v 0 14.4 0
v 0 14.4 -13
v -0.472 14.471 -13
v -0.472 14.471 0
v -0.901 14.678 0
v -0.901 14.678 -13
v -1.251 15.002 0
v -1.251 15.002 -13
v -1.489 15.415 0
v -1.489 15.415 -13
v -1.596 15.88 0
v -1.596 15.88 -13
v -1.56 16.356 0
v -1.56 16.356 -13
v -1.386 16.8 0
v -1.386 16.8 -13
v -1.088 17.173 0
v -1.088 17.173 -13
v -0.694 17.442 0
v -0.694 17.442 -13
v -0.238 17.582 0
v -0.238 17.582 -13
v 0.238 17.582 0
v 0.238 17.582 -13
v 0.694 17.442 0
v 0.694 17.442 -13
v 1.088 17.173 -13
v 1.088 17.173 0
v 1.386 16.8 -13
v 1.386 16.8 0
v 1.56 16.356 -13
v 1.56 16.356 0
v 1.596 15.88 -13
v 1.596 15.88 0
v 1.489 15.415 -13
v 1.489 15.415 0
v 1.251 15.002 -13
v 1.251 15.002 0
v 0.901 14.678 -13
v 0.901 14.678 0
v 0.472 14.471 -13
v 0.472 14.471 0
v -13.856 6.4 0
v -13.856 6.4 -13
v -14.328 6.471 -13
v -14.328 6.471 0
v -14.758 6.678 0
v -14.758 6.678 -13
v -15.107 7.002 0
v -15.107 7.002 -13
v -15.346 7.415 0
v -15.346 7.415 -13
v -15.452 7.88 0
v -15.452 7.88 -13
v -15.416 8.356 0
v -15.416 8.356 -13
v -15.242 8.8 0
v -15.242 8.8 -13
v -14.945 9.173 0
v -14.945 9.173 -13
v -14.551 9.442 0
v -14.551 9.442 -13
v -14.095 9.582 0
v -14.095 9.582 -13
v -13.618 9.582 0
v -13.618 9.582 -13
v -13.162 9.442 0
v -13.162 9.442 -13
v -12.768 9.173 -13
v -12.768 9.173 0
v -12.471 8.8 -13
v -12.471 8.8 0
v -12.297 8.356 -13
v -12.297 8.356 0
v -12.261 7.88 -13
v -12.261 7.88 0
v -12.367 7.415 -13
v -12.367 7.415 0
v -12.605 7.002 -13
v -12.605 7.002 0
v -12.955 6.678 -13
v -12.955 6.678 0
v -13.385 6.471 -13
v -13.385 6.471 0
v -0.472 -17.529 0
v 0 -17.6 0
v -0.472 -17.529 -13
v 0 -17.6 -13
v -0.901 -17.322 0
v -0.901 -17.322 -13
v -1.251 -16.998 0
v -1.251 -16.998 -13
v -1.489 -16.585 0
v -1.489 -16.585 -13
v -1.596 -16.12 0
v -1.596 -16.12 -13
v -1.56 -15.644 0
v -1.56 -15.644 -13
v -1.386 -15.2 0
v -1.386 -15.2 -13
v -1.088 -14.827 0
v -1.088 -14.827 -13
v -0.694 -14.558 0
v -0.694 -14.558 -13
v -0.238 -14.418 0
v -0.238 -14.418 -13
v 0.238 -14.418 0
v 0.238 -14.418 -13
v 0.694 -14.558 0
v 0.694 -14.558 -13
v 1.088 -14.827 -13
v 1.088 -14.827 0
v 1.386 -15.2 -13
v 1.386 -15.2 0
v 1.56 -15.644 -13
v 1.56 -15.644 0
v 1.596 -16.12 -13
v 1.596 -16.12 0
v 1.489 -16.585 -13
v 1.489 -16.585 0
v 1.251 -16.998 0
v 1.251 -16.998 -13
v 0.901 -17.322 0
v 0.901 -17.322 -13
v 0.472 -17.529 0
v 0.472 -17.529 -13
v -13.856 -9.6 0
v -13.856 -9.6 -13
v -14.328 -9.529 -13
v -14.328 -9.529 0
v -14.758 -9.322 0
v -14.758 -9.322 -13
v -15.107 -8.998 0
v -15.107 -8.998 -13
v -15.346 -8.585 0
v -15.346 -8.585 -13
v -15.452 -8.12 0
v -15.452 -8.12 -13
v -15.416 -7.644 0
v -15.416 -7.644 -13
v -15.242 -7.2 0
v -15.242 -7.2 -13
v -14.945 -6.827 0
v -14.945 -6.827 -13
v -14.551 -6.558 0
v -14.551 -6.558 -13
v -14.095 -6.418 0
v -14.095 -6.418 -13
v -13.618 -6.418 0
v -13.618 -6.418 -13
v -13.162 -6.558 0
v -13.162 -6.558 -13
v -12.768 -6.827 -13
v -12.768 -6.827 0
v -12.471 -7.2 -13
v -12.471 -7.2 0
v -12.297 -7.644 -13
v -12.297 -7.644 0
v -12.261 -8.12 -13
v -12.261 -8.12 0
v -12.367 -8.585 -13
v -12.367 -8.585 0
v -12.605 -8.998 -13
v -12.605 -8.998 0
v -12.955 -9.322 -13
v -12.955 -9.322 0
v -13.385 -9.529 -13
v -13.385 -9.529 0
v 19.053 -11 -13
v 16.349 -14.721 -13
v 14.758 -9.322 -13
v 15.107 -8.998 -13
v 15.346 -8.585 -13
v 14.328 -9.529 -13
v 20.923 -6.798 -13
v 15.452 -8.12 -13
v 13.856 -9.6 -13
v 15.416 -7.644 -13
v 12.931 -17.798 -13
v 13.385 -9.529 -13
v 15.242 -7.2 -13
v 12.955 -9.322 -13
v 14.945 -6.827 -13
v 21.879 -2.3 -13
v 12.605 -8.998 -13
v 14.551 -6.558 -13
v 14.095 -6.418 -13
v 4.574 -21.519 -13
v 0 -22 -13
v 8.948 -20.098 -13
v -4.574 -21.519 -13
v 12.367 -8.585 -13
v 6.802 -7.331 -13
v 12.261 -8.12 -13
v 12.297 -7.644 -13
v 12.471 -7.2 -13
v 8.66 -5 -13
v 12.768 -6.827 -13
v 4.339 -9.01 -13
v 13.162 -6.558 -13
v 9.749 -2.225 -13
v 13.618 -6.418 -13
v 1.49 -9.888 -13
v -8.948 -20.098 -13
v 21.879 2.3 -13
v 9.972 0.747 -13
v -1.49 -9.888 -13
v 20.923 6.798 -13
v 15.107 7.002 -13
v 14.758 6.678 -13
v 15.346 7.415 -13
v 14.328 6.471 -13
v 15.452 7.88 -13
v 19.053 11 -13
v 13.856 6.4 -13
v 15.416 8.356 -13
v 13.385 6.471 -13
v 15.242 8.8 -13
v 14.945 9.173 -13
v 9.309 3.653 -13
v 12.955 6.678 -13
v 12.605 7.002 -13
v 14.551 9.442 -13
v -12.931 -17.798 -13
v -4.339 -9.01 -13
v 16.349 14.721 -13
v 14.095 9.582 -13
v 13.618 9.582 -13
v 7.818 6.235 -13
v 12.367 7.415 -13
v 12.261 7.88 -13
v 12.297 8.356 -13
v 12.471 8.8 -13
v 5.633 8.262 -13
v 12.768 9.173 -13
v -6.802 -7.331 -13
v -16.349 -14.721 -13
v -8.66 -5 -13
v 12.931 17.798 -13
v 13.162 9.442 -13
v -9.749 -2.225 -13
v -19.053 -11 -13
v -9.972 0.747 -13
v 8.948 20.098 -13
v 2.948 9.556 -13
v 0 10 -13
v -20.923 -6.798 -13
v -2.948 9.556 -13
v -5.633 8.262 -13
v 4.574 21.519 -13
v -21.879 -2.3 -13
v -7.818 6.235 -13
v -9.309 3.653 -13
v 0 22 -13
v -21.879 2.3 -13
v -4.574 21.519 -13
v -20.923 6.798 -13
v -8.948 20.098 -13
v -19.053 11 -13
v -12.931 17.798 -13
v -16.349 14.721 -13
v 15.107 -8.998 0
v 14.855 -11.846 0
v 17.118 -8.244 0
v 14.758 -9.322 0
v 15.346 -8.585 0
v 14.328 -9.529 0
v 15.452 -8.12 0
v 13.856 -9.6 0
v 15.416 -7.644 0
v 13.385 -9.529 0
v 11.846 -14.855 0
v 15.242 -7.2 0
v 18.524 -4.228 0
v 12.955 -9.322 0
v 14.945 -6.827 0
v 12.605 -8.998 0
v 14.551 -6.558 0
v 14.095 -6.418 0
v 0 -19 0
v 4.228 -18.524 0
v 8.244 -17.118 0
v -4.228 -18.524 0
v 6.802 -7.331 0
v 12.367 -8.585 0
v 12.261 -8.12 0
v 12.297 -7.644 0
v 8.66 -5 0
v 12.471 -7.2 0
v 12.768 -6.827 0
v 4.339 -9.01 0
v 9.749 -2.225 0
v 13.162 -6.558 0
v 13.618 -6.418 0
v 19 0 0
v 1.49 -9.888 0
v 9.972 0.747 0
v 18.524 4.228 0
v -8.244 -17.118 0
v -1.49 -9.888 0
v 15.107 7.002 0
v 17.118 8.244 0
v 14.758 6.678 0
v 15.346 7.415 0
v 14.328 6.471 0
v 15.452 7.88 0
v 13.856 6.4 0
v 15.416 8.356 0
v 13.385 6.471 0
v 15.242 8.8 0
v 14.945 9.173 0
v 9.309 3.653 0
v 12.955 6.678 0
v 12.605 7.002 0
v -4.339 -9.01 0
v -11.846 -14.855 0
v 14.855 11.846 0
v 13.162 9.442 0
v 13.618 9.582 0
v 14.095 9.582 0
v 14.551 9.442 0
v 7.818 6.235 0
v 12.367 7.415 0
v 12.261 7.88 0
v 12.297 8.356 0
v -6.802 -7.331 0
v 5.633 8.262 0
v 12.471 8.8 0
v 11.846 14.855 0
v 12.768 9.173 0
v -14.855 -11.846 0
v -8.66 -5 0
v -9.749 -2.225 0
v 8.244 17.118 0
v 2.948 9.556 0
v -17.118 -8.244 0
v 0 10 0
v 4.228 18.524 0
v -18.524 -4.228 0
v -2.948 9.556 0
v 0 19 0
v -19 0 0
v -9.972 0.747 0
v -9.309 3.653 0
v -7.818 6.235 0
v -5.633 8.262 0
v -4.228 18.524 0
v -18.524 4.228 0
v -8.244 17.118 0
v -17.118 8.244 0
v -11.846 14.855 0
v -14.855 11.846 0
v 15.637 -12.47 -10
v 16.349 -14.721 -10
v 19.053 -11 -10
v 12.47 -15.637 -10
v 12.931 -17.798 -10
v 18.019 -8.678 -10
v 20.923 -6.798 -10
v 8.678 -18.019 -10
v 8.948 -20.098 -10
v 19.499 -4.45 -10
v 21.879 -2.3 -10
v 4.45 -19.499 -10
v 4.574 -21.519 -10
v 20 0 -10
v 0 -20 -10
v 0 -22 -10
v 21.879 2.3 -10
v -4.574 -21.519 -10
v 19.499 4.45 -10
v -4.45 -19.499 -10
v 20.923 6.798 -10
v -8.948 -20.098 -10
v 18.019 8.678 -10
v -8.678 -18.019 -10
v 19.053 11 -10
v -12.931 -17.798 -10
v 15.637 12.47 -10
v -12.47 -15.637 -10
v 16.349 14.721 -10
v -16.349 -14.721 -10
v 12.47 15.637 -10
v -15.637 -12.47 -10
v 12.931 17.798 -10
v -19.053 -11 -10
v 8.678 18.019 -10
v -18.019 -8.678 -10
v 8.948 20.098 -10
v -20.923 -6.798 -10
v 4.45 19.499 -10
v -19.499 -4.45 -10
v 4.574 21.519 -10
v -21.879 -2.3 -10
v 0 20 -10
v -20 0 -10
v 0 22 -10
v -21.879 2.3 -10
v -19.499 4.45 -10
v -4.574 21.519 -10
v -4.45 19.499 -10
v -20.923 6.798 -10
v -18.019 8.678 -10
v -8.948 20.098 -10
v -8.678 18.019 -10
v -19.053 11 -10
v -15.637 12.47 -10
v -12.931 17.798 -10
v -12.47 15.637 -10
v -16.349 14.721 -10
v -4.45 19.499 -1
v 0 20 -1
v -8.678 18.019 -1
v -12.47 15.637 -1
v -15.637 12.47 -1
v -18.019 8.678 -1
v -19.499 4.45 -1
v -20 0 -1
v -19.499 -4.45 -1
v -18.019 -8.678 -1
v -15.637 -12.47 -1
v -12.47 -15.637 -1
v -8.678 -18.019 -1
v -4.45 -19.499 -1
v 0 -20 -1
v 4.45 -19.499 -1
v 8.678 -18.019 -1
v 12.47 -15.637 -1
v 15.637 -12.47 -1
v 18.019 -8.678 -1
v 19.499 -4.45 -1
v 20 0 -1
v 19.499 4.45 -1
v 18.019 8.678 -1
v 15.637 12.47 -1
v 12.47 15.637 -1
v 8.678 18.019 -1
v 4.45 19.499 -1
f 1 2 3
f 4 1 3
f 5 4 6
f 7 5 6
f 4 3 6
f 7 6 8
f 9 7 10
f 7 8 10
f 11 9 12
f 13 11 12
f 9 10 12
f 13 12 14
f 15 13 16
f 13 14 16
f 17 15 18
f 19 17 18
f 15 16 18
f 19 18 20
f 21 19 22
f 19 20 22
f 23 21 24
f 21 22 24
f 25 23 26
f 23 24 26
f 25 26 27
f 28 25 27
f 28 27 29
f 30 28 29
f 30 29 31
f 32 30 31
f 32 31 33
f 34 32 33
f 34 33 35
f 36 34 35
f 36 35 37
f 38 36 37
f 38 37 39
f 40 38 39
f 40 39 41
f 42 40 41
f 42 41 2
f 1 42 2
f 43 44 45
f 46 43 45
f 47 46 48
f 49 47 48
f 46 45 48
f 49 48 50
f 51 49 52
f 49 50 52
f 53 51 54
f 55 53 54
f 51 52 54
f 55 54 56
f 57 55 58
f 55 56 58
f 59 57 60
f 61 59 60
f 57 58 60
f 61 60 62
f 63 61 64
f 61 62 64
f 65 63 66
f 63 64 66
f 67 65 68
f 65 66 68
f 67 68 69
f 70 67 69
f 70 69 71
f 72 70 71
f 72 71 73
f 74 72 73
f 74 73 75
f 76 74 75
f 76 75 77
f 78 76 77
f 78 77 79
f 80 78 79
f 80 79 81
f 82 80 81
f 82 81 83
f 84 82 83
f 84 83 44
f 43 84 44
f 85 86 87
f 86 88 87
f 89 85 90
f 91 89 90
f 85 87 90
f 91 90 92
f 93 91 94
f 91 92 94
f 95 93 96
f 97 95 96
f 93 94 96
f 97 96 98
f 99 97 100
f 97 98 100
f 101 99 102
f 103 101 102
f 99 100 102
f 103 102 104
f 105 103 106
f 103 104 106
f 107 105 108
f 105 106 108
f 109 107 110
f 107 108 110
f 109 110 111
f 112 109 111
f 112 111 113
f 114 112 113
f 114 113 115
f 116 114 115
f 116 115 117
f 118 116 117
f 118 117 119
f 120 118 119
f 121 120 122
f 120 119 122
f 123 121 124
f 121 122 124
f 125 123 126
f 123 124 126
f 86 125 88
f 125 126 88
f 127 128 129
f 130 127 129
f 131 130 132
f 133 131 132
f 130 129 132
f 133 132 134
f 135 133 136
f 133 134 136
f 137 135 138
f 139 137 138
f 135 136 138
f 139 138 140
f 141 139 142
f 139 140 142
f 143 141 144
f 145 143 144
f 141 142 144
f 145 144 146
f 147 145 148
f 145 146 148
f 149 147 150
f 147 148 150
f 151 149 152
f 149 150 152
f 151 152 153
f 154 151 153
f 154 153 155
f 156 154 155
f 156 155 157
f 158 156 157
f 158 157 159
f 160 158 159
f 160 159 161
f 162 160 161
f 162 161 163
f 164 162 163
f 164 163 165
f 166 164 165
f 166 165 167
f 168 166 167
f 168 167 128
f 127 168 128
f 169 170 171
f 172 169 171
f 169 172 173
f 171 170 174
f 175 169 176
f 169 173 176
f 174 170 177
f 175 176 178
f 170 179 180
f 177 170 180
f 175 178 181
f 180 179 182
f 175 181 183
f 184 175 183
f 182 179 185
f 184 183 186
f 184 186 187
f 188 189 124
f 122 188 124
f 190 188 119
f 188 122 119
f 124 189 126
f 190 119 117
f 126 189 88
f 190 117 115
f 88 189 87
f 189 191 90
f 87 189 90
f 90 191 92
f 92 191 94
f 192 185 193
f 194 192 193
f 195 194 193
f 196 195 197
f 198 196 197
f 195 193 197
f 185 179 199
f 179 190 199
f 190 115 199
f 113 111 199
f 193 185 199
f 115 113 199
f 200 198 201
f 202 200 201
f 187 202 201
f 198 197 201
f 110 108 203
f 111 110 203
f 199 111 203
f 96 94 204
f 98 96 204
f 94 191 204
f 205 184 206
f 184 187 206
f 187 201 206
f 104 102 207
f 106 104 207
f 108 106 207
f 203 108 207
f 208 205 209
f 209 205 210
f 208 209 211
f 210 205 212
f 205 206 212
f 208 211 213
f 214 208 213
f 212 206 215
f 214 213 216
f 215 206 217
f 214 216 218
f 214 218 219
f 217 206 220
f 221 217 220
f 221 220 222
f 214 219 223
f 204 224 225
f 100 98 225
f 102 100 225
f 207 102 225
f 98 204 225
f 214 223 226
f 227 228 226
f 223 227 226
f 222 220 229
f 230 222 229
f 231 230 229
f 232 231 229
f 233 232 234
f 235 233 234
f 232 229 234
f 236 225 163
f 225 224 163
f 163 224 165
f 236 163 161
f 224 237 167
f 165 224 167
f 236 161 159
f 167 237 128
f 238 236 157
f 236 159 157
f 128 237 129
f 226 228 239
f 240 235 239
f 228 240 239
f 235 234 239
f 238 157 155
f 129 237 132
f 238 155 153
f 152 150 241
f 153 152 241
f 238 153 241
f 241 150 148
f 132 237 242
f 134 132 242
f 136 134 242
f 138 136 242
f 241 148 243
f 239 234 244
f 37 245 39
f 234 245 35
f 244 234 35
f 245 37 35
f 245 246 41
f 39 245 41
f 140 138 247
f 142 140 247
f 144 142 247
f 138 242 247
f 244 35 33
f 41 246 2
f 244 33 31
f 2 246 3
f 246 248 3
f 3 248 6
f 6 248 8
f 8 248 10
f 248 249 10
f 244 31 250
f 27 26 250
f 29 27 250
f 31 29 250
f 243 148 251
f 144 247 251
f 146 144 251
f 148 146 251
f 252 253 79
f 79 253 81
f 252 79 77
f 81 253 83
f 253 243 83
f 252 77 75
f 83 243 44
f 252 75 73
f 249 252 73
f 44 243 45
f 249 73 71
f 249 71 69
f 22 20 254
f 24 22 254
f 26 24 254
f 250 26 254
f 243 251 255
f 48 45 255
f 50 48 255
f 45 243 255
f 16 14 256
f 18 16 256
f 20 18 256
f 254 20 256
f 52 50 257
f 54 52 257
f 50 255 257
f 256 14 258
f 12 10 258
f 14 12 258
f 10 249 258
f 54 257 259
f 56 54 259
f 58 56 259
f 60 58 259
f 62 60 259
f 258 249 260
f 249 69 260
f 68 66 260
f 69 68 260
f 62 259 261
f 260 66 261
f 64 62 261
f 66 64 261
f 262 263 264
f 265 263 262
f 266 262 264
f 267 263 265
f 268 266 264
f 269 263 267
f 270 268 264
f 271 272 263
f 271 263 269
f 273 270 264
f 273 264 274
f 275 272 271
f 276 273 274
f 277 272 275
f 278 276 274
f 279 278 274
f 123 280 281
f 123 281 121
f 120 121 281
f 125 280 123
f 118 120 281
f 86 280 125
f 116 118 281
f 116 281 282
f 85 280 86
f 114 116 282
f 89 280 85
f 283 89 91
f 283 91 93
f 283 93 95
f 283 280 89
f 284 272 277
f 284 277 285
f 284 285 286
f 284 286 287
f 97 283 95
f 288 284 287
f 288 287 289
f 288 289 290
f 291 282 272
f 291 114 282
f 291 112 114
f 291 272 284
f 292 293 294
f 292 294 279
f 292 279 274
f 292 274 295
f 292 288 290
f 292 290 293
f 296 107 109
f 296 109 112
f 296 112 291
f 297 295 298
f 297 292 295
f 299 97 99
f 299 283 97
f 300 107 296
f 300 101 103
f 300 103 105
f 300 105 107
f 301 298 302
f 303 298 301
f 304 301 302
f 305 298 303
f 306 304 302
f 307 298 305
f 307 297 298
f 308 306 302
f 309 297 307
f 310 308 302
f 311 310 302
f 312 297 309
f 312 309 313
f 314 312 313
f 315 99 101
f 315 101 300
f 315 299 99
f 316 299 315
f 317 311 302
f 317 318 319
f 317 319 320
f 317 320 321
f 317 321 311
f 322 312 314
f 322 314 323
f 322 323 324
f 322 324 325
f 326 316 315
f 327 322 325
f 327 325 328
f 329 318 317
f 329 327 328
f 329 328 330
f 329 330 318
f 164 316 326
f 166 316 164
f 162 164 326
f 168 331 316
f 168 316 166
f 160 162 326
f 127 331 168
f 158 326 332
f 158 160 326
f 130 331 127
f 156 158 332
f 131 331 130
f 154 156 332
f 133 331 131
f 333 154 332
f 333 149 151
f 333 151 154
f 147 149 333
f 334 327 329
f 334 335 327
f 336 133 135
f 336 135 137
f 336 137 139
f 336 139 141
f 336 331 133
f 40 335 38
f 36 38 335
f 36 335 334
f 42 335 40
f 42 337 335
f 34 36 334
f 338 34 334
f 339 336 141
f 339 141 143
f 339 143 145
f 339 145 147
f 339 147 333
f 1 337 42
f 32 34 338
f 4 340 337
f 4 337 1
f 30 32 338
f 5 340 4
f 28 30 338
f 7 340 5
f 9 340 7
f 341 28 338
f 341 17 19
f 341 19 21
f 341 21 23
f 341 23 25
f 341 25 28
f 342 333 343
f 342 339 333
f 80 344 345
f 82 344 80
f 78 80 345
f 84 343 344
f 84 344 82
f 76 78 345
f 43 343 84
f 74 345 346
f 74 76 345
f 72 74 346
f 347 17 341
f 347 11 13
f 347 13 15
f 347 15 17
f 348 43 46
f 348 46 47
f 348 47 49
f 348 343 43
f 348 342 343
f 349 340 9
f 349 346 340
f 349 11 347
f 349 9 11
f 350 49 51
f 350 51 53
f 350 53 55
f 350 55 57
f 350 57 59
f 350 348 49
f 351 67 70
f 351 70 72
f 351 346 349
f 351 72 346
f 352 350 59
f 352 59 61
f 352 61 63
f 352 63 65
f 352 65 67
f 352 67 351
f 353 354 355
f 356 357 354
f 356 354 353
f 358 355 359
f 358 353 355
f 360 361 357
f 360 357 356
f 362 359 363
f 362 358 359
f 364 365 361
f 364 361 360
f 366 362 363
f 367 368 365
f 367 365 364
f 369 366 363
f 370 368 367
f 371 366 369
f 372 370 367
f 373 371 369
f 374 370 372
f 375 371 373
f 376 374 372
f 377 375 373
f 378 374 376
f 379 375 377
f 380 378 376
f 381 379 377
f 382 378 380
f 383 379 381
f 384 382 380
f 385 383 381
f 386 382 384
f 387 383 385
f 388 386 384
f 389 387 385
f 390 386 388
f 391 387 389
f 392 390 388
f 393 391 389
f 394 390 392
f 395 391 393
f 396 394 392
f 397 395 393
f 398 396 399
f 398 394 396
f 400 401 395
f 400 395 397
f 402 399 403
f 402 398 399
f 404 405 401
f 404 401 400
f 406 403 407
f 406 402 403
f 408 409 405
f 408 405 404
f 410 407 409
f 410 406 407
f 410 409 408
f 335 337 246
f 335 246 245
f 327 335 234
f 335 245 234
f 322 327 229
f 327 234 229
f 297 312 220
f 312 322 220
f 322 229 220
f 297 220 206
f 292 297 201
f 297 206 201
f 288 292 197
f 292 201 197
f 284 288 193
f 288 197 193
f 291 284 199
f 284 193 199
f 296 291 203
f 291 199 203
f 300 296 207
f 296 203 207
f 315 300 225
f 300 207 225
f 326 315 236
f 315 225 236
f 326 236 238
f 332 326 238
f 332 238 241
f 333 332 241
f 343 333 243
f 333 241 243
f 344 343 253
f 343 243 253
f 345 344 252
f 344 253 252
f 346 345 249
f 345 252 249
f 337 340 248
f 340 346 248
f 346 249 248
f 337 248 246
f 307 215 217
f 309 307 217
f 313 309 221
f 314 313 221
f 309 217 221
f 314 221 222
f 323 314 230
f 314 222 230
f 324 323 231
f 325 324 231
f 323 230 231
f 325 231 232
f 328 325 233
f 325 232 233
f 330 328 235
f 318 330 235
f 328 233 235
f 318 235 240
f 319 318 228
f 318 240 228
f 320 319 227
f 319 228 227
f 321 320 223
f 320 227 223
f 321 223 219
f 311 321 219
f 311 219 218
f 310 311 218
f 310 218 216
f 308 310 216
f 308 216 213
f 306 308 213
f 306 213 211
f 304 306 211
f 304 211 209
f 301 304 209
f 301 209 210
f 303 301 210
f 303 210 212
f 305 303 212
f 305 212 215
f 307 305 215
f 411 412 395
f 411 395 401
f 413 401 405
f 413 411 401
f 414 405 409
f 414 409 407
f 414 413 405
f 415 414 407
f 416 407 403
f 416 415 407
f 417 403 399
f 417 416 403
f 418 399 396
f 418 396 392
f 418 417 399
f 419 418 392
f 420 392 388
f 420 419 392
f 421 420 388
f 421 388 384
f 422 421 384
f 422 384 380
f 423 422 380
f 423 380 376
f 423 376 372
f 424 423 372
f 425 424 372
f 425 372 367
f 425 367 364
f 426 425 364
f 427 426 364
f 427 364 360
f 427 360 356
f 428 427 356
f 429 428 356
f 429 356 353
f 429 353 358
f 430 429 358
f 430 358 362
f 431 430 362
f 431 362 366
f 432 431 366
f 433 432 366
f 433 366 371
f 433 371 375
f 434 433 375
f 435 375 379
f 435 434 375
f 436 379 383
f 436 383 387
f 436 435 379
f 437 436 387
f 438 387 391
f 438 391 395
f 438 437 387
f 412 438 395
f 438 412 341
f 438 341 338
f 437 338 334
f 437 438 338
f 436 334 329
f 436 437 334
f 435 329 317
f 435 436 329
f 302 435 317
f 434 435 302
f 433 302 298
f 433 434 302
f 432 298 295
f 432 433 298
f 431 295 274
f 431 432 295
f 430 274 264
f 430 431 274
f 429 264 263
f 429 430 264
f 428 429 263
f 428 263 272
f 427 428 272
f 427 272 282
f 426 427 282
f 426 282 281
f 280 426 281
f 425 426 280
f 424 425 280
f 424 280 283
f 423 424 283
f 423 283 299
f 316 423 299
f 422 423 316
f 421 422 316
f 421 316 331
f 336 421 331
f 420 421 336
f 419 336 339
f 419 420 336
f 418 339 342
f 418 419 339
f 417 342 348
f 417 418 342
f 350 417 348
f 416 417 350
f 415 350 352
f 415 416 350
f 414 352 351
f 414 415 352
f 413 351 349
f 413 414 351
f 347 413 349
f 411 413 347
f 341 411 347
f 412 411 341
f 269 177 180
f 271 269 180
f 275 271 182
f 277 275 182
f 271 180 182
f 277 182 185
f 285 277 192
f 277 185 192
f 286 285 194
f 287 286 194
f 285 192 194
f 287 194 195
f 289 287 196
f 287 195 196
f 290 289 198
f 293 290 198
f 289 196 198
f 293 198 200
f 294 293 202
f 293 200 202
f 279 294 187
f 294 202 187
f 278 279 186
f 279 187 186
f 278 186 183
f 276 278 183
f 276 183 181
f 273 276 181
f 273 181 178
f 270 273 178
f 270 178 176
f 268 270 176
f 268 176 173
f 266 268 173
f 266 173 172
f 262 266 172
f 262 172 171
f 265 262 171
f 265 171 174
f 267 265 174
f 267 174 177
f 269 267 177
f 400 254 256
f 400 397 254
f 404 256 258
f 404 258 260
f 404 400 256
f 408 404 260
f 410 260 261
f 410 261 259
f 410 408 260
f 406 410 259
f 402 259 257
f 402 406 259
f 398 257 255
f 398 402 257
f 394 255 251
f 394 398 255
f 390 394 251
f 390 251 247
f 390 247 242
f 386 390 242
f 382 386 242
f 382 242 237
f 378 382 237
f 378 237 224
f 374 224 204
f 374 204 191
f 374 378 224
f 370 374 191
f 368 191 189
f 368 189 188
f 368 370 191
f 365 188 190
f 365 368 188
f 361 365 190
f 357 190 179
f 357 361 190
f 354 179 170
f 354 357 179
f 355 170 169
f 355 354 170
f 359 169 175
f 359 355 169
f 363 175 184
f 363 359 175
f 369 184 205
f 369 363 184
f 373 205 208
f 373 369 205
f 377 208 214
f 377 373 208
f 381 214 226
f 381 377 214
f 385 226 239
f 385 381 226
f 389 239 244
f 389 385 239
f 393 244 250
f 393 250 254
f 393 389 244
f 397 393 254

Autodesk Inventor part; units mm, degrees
ref_plane "YZ Plane" through (0, 0, 0) normal (1, 0, 0) x (0, 1, 0)
ref_plane "XZ Plane" through (0, 0, 0) normal (0, 1, 0) x (-1, 0, 0)
ref_plane "XY Plane" through (0, 0, 0) normal (0, 0, 1) x (1, 0, 0)
sketch "スケッチ1" plane through (0, 0, 0) normal (1, 0, 0) x (0, 1, 0)
  line L0 (10, 0) -> (10, -13)
  line L1 (22, -13) -> (22, -10)
  line L2 (22, -10) -> (20, -10)
  line L3 (20, -10) -> (20, 0)
  line L4 (20, 0) -> (10, 0)
  line L5 (0, -15.6) -> (0, 2.6) projected
  line L6 (22, -13) -> (10, -13)
  point P0 (0, 0)
  dimension "d0" = 20
  dimension "d1" = 2
  dimension "d2" = 10
  dimension "d3" = 3
  dimension "d4" = 10
revolve "回転1" add sketch "スケッチ1" angle 360 about axis through (0, 0, -10) along (0, 0, 1)
sketch "スケッチ2" plane through (0, 0, 0) normal (0, 0, 1) x (1, 0, 0)
  circle A0 centre (0, 0) radius 20 projected
  circle A1 centre (0, 0) radius 16
  point P0 (0, 16)
  point P1 (-13.8564, 8)
  point P2 (-13.8564, -8)
  point P3 (0, -16)
  point P4 (13.8564, -8)
  point P5 (13.8564, 8)
  dimension "d8" = 4
  dimension "d11" = 360
hole "穴1" at (0, 16, 0) at (-13.8564, 8, 0) at (-13.8564, -8, 0) at (0, -16, 0) at (13.8564, -8, 0) at (13.8564, 8, 0) direction (0, 0, -1) diameter 3.2 end through all clearance for "Socket Head Cap Screw" size "M3" standard "Ansi Metric M Profile"
chamfer "面取り1" distance 1 angle 45 1 edges at (0, -20, 0)
properties part number "base10" material "ABS プラスチック"
